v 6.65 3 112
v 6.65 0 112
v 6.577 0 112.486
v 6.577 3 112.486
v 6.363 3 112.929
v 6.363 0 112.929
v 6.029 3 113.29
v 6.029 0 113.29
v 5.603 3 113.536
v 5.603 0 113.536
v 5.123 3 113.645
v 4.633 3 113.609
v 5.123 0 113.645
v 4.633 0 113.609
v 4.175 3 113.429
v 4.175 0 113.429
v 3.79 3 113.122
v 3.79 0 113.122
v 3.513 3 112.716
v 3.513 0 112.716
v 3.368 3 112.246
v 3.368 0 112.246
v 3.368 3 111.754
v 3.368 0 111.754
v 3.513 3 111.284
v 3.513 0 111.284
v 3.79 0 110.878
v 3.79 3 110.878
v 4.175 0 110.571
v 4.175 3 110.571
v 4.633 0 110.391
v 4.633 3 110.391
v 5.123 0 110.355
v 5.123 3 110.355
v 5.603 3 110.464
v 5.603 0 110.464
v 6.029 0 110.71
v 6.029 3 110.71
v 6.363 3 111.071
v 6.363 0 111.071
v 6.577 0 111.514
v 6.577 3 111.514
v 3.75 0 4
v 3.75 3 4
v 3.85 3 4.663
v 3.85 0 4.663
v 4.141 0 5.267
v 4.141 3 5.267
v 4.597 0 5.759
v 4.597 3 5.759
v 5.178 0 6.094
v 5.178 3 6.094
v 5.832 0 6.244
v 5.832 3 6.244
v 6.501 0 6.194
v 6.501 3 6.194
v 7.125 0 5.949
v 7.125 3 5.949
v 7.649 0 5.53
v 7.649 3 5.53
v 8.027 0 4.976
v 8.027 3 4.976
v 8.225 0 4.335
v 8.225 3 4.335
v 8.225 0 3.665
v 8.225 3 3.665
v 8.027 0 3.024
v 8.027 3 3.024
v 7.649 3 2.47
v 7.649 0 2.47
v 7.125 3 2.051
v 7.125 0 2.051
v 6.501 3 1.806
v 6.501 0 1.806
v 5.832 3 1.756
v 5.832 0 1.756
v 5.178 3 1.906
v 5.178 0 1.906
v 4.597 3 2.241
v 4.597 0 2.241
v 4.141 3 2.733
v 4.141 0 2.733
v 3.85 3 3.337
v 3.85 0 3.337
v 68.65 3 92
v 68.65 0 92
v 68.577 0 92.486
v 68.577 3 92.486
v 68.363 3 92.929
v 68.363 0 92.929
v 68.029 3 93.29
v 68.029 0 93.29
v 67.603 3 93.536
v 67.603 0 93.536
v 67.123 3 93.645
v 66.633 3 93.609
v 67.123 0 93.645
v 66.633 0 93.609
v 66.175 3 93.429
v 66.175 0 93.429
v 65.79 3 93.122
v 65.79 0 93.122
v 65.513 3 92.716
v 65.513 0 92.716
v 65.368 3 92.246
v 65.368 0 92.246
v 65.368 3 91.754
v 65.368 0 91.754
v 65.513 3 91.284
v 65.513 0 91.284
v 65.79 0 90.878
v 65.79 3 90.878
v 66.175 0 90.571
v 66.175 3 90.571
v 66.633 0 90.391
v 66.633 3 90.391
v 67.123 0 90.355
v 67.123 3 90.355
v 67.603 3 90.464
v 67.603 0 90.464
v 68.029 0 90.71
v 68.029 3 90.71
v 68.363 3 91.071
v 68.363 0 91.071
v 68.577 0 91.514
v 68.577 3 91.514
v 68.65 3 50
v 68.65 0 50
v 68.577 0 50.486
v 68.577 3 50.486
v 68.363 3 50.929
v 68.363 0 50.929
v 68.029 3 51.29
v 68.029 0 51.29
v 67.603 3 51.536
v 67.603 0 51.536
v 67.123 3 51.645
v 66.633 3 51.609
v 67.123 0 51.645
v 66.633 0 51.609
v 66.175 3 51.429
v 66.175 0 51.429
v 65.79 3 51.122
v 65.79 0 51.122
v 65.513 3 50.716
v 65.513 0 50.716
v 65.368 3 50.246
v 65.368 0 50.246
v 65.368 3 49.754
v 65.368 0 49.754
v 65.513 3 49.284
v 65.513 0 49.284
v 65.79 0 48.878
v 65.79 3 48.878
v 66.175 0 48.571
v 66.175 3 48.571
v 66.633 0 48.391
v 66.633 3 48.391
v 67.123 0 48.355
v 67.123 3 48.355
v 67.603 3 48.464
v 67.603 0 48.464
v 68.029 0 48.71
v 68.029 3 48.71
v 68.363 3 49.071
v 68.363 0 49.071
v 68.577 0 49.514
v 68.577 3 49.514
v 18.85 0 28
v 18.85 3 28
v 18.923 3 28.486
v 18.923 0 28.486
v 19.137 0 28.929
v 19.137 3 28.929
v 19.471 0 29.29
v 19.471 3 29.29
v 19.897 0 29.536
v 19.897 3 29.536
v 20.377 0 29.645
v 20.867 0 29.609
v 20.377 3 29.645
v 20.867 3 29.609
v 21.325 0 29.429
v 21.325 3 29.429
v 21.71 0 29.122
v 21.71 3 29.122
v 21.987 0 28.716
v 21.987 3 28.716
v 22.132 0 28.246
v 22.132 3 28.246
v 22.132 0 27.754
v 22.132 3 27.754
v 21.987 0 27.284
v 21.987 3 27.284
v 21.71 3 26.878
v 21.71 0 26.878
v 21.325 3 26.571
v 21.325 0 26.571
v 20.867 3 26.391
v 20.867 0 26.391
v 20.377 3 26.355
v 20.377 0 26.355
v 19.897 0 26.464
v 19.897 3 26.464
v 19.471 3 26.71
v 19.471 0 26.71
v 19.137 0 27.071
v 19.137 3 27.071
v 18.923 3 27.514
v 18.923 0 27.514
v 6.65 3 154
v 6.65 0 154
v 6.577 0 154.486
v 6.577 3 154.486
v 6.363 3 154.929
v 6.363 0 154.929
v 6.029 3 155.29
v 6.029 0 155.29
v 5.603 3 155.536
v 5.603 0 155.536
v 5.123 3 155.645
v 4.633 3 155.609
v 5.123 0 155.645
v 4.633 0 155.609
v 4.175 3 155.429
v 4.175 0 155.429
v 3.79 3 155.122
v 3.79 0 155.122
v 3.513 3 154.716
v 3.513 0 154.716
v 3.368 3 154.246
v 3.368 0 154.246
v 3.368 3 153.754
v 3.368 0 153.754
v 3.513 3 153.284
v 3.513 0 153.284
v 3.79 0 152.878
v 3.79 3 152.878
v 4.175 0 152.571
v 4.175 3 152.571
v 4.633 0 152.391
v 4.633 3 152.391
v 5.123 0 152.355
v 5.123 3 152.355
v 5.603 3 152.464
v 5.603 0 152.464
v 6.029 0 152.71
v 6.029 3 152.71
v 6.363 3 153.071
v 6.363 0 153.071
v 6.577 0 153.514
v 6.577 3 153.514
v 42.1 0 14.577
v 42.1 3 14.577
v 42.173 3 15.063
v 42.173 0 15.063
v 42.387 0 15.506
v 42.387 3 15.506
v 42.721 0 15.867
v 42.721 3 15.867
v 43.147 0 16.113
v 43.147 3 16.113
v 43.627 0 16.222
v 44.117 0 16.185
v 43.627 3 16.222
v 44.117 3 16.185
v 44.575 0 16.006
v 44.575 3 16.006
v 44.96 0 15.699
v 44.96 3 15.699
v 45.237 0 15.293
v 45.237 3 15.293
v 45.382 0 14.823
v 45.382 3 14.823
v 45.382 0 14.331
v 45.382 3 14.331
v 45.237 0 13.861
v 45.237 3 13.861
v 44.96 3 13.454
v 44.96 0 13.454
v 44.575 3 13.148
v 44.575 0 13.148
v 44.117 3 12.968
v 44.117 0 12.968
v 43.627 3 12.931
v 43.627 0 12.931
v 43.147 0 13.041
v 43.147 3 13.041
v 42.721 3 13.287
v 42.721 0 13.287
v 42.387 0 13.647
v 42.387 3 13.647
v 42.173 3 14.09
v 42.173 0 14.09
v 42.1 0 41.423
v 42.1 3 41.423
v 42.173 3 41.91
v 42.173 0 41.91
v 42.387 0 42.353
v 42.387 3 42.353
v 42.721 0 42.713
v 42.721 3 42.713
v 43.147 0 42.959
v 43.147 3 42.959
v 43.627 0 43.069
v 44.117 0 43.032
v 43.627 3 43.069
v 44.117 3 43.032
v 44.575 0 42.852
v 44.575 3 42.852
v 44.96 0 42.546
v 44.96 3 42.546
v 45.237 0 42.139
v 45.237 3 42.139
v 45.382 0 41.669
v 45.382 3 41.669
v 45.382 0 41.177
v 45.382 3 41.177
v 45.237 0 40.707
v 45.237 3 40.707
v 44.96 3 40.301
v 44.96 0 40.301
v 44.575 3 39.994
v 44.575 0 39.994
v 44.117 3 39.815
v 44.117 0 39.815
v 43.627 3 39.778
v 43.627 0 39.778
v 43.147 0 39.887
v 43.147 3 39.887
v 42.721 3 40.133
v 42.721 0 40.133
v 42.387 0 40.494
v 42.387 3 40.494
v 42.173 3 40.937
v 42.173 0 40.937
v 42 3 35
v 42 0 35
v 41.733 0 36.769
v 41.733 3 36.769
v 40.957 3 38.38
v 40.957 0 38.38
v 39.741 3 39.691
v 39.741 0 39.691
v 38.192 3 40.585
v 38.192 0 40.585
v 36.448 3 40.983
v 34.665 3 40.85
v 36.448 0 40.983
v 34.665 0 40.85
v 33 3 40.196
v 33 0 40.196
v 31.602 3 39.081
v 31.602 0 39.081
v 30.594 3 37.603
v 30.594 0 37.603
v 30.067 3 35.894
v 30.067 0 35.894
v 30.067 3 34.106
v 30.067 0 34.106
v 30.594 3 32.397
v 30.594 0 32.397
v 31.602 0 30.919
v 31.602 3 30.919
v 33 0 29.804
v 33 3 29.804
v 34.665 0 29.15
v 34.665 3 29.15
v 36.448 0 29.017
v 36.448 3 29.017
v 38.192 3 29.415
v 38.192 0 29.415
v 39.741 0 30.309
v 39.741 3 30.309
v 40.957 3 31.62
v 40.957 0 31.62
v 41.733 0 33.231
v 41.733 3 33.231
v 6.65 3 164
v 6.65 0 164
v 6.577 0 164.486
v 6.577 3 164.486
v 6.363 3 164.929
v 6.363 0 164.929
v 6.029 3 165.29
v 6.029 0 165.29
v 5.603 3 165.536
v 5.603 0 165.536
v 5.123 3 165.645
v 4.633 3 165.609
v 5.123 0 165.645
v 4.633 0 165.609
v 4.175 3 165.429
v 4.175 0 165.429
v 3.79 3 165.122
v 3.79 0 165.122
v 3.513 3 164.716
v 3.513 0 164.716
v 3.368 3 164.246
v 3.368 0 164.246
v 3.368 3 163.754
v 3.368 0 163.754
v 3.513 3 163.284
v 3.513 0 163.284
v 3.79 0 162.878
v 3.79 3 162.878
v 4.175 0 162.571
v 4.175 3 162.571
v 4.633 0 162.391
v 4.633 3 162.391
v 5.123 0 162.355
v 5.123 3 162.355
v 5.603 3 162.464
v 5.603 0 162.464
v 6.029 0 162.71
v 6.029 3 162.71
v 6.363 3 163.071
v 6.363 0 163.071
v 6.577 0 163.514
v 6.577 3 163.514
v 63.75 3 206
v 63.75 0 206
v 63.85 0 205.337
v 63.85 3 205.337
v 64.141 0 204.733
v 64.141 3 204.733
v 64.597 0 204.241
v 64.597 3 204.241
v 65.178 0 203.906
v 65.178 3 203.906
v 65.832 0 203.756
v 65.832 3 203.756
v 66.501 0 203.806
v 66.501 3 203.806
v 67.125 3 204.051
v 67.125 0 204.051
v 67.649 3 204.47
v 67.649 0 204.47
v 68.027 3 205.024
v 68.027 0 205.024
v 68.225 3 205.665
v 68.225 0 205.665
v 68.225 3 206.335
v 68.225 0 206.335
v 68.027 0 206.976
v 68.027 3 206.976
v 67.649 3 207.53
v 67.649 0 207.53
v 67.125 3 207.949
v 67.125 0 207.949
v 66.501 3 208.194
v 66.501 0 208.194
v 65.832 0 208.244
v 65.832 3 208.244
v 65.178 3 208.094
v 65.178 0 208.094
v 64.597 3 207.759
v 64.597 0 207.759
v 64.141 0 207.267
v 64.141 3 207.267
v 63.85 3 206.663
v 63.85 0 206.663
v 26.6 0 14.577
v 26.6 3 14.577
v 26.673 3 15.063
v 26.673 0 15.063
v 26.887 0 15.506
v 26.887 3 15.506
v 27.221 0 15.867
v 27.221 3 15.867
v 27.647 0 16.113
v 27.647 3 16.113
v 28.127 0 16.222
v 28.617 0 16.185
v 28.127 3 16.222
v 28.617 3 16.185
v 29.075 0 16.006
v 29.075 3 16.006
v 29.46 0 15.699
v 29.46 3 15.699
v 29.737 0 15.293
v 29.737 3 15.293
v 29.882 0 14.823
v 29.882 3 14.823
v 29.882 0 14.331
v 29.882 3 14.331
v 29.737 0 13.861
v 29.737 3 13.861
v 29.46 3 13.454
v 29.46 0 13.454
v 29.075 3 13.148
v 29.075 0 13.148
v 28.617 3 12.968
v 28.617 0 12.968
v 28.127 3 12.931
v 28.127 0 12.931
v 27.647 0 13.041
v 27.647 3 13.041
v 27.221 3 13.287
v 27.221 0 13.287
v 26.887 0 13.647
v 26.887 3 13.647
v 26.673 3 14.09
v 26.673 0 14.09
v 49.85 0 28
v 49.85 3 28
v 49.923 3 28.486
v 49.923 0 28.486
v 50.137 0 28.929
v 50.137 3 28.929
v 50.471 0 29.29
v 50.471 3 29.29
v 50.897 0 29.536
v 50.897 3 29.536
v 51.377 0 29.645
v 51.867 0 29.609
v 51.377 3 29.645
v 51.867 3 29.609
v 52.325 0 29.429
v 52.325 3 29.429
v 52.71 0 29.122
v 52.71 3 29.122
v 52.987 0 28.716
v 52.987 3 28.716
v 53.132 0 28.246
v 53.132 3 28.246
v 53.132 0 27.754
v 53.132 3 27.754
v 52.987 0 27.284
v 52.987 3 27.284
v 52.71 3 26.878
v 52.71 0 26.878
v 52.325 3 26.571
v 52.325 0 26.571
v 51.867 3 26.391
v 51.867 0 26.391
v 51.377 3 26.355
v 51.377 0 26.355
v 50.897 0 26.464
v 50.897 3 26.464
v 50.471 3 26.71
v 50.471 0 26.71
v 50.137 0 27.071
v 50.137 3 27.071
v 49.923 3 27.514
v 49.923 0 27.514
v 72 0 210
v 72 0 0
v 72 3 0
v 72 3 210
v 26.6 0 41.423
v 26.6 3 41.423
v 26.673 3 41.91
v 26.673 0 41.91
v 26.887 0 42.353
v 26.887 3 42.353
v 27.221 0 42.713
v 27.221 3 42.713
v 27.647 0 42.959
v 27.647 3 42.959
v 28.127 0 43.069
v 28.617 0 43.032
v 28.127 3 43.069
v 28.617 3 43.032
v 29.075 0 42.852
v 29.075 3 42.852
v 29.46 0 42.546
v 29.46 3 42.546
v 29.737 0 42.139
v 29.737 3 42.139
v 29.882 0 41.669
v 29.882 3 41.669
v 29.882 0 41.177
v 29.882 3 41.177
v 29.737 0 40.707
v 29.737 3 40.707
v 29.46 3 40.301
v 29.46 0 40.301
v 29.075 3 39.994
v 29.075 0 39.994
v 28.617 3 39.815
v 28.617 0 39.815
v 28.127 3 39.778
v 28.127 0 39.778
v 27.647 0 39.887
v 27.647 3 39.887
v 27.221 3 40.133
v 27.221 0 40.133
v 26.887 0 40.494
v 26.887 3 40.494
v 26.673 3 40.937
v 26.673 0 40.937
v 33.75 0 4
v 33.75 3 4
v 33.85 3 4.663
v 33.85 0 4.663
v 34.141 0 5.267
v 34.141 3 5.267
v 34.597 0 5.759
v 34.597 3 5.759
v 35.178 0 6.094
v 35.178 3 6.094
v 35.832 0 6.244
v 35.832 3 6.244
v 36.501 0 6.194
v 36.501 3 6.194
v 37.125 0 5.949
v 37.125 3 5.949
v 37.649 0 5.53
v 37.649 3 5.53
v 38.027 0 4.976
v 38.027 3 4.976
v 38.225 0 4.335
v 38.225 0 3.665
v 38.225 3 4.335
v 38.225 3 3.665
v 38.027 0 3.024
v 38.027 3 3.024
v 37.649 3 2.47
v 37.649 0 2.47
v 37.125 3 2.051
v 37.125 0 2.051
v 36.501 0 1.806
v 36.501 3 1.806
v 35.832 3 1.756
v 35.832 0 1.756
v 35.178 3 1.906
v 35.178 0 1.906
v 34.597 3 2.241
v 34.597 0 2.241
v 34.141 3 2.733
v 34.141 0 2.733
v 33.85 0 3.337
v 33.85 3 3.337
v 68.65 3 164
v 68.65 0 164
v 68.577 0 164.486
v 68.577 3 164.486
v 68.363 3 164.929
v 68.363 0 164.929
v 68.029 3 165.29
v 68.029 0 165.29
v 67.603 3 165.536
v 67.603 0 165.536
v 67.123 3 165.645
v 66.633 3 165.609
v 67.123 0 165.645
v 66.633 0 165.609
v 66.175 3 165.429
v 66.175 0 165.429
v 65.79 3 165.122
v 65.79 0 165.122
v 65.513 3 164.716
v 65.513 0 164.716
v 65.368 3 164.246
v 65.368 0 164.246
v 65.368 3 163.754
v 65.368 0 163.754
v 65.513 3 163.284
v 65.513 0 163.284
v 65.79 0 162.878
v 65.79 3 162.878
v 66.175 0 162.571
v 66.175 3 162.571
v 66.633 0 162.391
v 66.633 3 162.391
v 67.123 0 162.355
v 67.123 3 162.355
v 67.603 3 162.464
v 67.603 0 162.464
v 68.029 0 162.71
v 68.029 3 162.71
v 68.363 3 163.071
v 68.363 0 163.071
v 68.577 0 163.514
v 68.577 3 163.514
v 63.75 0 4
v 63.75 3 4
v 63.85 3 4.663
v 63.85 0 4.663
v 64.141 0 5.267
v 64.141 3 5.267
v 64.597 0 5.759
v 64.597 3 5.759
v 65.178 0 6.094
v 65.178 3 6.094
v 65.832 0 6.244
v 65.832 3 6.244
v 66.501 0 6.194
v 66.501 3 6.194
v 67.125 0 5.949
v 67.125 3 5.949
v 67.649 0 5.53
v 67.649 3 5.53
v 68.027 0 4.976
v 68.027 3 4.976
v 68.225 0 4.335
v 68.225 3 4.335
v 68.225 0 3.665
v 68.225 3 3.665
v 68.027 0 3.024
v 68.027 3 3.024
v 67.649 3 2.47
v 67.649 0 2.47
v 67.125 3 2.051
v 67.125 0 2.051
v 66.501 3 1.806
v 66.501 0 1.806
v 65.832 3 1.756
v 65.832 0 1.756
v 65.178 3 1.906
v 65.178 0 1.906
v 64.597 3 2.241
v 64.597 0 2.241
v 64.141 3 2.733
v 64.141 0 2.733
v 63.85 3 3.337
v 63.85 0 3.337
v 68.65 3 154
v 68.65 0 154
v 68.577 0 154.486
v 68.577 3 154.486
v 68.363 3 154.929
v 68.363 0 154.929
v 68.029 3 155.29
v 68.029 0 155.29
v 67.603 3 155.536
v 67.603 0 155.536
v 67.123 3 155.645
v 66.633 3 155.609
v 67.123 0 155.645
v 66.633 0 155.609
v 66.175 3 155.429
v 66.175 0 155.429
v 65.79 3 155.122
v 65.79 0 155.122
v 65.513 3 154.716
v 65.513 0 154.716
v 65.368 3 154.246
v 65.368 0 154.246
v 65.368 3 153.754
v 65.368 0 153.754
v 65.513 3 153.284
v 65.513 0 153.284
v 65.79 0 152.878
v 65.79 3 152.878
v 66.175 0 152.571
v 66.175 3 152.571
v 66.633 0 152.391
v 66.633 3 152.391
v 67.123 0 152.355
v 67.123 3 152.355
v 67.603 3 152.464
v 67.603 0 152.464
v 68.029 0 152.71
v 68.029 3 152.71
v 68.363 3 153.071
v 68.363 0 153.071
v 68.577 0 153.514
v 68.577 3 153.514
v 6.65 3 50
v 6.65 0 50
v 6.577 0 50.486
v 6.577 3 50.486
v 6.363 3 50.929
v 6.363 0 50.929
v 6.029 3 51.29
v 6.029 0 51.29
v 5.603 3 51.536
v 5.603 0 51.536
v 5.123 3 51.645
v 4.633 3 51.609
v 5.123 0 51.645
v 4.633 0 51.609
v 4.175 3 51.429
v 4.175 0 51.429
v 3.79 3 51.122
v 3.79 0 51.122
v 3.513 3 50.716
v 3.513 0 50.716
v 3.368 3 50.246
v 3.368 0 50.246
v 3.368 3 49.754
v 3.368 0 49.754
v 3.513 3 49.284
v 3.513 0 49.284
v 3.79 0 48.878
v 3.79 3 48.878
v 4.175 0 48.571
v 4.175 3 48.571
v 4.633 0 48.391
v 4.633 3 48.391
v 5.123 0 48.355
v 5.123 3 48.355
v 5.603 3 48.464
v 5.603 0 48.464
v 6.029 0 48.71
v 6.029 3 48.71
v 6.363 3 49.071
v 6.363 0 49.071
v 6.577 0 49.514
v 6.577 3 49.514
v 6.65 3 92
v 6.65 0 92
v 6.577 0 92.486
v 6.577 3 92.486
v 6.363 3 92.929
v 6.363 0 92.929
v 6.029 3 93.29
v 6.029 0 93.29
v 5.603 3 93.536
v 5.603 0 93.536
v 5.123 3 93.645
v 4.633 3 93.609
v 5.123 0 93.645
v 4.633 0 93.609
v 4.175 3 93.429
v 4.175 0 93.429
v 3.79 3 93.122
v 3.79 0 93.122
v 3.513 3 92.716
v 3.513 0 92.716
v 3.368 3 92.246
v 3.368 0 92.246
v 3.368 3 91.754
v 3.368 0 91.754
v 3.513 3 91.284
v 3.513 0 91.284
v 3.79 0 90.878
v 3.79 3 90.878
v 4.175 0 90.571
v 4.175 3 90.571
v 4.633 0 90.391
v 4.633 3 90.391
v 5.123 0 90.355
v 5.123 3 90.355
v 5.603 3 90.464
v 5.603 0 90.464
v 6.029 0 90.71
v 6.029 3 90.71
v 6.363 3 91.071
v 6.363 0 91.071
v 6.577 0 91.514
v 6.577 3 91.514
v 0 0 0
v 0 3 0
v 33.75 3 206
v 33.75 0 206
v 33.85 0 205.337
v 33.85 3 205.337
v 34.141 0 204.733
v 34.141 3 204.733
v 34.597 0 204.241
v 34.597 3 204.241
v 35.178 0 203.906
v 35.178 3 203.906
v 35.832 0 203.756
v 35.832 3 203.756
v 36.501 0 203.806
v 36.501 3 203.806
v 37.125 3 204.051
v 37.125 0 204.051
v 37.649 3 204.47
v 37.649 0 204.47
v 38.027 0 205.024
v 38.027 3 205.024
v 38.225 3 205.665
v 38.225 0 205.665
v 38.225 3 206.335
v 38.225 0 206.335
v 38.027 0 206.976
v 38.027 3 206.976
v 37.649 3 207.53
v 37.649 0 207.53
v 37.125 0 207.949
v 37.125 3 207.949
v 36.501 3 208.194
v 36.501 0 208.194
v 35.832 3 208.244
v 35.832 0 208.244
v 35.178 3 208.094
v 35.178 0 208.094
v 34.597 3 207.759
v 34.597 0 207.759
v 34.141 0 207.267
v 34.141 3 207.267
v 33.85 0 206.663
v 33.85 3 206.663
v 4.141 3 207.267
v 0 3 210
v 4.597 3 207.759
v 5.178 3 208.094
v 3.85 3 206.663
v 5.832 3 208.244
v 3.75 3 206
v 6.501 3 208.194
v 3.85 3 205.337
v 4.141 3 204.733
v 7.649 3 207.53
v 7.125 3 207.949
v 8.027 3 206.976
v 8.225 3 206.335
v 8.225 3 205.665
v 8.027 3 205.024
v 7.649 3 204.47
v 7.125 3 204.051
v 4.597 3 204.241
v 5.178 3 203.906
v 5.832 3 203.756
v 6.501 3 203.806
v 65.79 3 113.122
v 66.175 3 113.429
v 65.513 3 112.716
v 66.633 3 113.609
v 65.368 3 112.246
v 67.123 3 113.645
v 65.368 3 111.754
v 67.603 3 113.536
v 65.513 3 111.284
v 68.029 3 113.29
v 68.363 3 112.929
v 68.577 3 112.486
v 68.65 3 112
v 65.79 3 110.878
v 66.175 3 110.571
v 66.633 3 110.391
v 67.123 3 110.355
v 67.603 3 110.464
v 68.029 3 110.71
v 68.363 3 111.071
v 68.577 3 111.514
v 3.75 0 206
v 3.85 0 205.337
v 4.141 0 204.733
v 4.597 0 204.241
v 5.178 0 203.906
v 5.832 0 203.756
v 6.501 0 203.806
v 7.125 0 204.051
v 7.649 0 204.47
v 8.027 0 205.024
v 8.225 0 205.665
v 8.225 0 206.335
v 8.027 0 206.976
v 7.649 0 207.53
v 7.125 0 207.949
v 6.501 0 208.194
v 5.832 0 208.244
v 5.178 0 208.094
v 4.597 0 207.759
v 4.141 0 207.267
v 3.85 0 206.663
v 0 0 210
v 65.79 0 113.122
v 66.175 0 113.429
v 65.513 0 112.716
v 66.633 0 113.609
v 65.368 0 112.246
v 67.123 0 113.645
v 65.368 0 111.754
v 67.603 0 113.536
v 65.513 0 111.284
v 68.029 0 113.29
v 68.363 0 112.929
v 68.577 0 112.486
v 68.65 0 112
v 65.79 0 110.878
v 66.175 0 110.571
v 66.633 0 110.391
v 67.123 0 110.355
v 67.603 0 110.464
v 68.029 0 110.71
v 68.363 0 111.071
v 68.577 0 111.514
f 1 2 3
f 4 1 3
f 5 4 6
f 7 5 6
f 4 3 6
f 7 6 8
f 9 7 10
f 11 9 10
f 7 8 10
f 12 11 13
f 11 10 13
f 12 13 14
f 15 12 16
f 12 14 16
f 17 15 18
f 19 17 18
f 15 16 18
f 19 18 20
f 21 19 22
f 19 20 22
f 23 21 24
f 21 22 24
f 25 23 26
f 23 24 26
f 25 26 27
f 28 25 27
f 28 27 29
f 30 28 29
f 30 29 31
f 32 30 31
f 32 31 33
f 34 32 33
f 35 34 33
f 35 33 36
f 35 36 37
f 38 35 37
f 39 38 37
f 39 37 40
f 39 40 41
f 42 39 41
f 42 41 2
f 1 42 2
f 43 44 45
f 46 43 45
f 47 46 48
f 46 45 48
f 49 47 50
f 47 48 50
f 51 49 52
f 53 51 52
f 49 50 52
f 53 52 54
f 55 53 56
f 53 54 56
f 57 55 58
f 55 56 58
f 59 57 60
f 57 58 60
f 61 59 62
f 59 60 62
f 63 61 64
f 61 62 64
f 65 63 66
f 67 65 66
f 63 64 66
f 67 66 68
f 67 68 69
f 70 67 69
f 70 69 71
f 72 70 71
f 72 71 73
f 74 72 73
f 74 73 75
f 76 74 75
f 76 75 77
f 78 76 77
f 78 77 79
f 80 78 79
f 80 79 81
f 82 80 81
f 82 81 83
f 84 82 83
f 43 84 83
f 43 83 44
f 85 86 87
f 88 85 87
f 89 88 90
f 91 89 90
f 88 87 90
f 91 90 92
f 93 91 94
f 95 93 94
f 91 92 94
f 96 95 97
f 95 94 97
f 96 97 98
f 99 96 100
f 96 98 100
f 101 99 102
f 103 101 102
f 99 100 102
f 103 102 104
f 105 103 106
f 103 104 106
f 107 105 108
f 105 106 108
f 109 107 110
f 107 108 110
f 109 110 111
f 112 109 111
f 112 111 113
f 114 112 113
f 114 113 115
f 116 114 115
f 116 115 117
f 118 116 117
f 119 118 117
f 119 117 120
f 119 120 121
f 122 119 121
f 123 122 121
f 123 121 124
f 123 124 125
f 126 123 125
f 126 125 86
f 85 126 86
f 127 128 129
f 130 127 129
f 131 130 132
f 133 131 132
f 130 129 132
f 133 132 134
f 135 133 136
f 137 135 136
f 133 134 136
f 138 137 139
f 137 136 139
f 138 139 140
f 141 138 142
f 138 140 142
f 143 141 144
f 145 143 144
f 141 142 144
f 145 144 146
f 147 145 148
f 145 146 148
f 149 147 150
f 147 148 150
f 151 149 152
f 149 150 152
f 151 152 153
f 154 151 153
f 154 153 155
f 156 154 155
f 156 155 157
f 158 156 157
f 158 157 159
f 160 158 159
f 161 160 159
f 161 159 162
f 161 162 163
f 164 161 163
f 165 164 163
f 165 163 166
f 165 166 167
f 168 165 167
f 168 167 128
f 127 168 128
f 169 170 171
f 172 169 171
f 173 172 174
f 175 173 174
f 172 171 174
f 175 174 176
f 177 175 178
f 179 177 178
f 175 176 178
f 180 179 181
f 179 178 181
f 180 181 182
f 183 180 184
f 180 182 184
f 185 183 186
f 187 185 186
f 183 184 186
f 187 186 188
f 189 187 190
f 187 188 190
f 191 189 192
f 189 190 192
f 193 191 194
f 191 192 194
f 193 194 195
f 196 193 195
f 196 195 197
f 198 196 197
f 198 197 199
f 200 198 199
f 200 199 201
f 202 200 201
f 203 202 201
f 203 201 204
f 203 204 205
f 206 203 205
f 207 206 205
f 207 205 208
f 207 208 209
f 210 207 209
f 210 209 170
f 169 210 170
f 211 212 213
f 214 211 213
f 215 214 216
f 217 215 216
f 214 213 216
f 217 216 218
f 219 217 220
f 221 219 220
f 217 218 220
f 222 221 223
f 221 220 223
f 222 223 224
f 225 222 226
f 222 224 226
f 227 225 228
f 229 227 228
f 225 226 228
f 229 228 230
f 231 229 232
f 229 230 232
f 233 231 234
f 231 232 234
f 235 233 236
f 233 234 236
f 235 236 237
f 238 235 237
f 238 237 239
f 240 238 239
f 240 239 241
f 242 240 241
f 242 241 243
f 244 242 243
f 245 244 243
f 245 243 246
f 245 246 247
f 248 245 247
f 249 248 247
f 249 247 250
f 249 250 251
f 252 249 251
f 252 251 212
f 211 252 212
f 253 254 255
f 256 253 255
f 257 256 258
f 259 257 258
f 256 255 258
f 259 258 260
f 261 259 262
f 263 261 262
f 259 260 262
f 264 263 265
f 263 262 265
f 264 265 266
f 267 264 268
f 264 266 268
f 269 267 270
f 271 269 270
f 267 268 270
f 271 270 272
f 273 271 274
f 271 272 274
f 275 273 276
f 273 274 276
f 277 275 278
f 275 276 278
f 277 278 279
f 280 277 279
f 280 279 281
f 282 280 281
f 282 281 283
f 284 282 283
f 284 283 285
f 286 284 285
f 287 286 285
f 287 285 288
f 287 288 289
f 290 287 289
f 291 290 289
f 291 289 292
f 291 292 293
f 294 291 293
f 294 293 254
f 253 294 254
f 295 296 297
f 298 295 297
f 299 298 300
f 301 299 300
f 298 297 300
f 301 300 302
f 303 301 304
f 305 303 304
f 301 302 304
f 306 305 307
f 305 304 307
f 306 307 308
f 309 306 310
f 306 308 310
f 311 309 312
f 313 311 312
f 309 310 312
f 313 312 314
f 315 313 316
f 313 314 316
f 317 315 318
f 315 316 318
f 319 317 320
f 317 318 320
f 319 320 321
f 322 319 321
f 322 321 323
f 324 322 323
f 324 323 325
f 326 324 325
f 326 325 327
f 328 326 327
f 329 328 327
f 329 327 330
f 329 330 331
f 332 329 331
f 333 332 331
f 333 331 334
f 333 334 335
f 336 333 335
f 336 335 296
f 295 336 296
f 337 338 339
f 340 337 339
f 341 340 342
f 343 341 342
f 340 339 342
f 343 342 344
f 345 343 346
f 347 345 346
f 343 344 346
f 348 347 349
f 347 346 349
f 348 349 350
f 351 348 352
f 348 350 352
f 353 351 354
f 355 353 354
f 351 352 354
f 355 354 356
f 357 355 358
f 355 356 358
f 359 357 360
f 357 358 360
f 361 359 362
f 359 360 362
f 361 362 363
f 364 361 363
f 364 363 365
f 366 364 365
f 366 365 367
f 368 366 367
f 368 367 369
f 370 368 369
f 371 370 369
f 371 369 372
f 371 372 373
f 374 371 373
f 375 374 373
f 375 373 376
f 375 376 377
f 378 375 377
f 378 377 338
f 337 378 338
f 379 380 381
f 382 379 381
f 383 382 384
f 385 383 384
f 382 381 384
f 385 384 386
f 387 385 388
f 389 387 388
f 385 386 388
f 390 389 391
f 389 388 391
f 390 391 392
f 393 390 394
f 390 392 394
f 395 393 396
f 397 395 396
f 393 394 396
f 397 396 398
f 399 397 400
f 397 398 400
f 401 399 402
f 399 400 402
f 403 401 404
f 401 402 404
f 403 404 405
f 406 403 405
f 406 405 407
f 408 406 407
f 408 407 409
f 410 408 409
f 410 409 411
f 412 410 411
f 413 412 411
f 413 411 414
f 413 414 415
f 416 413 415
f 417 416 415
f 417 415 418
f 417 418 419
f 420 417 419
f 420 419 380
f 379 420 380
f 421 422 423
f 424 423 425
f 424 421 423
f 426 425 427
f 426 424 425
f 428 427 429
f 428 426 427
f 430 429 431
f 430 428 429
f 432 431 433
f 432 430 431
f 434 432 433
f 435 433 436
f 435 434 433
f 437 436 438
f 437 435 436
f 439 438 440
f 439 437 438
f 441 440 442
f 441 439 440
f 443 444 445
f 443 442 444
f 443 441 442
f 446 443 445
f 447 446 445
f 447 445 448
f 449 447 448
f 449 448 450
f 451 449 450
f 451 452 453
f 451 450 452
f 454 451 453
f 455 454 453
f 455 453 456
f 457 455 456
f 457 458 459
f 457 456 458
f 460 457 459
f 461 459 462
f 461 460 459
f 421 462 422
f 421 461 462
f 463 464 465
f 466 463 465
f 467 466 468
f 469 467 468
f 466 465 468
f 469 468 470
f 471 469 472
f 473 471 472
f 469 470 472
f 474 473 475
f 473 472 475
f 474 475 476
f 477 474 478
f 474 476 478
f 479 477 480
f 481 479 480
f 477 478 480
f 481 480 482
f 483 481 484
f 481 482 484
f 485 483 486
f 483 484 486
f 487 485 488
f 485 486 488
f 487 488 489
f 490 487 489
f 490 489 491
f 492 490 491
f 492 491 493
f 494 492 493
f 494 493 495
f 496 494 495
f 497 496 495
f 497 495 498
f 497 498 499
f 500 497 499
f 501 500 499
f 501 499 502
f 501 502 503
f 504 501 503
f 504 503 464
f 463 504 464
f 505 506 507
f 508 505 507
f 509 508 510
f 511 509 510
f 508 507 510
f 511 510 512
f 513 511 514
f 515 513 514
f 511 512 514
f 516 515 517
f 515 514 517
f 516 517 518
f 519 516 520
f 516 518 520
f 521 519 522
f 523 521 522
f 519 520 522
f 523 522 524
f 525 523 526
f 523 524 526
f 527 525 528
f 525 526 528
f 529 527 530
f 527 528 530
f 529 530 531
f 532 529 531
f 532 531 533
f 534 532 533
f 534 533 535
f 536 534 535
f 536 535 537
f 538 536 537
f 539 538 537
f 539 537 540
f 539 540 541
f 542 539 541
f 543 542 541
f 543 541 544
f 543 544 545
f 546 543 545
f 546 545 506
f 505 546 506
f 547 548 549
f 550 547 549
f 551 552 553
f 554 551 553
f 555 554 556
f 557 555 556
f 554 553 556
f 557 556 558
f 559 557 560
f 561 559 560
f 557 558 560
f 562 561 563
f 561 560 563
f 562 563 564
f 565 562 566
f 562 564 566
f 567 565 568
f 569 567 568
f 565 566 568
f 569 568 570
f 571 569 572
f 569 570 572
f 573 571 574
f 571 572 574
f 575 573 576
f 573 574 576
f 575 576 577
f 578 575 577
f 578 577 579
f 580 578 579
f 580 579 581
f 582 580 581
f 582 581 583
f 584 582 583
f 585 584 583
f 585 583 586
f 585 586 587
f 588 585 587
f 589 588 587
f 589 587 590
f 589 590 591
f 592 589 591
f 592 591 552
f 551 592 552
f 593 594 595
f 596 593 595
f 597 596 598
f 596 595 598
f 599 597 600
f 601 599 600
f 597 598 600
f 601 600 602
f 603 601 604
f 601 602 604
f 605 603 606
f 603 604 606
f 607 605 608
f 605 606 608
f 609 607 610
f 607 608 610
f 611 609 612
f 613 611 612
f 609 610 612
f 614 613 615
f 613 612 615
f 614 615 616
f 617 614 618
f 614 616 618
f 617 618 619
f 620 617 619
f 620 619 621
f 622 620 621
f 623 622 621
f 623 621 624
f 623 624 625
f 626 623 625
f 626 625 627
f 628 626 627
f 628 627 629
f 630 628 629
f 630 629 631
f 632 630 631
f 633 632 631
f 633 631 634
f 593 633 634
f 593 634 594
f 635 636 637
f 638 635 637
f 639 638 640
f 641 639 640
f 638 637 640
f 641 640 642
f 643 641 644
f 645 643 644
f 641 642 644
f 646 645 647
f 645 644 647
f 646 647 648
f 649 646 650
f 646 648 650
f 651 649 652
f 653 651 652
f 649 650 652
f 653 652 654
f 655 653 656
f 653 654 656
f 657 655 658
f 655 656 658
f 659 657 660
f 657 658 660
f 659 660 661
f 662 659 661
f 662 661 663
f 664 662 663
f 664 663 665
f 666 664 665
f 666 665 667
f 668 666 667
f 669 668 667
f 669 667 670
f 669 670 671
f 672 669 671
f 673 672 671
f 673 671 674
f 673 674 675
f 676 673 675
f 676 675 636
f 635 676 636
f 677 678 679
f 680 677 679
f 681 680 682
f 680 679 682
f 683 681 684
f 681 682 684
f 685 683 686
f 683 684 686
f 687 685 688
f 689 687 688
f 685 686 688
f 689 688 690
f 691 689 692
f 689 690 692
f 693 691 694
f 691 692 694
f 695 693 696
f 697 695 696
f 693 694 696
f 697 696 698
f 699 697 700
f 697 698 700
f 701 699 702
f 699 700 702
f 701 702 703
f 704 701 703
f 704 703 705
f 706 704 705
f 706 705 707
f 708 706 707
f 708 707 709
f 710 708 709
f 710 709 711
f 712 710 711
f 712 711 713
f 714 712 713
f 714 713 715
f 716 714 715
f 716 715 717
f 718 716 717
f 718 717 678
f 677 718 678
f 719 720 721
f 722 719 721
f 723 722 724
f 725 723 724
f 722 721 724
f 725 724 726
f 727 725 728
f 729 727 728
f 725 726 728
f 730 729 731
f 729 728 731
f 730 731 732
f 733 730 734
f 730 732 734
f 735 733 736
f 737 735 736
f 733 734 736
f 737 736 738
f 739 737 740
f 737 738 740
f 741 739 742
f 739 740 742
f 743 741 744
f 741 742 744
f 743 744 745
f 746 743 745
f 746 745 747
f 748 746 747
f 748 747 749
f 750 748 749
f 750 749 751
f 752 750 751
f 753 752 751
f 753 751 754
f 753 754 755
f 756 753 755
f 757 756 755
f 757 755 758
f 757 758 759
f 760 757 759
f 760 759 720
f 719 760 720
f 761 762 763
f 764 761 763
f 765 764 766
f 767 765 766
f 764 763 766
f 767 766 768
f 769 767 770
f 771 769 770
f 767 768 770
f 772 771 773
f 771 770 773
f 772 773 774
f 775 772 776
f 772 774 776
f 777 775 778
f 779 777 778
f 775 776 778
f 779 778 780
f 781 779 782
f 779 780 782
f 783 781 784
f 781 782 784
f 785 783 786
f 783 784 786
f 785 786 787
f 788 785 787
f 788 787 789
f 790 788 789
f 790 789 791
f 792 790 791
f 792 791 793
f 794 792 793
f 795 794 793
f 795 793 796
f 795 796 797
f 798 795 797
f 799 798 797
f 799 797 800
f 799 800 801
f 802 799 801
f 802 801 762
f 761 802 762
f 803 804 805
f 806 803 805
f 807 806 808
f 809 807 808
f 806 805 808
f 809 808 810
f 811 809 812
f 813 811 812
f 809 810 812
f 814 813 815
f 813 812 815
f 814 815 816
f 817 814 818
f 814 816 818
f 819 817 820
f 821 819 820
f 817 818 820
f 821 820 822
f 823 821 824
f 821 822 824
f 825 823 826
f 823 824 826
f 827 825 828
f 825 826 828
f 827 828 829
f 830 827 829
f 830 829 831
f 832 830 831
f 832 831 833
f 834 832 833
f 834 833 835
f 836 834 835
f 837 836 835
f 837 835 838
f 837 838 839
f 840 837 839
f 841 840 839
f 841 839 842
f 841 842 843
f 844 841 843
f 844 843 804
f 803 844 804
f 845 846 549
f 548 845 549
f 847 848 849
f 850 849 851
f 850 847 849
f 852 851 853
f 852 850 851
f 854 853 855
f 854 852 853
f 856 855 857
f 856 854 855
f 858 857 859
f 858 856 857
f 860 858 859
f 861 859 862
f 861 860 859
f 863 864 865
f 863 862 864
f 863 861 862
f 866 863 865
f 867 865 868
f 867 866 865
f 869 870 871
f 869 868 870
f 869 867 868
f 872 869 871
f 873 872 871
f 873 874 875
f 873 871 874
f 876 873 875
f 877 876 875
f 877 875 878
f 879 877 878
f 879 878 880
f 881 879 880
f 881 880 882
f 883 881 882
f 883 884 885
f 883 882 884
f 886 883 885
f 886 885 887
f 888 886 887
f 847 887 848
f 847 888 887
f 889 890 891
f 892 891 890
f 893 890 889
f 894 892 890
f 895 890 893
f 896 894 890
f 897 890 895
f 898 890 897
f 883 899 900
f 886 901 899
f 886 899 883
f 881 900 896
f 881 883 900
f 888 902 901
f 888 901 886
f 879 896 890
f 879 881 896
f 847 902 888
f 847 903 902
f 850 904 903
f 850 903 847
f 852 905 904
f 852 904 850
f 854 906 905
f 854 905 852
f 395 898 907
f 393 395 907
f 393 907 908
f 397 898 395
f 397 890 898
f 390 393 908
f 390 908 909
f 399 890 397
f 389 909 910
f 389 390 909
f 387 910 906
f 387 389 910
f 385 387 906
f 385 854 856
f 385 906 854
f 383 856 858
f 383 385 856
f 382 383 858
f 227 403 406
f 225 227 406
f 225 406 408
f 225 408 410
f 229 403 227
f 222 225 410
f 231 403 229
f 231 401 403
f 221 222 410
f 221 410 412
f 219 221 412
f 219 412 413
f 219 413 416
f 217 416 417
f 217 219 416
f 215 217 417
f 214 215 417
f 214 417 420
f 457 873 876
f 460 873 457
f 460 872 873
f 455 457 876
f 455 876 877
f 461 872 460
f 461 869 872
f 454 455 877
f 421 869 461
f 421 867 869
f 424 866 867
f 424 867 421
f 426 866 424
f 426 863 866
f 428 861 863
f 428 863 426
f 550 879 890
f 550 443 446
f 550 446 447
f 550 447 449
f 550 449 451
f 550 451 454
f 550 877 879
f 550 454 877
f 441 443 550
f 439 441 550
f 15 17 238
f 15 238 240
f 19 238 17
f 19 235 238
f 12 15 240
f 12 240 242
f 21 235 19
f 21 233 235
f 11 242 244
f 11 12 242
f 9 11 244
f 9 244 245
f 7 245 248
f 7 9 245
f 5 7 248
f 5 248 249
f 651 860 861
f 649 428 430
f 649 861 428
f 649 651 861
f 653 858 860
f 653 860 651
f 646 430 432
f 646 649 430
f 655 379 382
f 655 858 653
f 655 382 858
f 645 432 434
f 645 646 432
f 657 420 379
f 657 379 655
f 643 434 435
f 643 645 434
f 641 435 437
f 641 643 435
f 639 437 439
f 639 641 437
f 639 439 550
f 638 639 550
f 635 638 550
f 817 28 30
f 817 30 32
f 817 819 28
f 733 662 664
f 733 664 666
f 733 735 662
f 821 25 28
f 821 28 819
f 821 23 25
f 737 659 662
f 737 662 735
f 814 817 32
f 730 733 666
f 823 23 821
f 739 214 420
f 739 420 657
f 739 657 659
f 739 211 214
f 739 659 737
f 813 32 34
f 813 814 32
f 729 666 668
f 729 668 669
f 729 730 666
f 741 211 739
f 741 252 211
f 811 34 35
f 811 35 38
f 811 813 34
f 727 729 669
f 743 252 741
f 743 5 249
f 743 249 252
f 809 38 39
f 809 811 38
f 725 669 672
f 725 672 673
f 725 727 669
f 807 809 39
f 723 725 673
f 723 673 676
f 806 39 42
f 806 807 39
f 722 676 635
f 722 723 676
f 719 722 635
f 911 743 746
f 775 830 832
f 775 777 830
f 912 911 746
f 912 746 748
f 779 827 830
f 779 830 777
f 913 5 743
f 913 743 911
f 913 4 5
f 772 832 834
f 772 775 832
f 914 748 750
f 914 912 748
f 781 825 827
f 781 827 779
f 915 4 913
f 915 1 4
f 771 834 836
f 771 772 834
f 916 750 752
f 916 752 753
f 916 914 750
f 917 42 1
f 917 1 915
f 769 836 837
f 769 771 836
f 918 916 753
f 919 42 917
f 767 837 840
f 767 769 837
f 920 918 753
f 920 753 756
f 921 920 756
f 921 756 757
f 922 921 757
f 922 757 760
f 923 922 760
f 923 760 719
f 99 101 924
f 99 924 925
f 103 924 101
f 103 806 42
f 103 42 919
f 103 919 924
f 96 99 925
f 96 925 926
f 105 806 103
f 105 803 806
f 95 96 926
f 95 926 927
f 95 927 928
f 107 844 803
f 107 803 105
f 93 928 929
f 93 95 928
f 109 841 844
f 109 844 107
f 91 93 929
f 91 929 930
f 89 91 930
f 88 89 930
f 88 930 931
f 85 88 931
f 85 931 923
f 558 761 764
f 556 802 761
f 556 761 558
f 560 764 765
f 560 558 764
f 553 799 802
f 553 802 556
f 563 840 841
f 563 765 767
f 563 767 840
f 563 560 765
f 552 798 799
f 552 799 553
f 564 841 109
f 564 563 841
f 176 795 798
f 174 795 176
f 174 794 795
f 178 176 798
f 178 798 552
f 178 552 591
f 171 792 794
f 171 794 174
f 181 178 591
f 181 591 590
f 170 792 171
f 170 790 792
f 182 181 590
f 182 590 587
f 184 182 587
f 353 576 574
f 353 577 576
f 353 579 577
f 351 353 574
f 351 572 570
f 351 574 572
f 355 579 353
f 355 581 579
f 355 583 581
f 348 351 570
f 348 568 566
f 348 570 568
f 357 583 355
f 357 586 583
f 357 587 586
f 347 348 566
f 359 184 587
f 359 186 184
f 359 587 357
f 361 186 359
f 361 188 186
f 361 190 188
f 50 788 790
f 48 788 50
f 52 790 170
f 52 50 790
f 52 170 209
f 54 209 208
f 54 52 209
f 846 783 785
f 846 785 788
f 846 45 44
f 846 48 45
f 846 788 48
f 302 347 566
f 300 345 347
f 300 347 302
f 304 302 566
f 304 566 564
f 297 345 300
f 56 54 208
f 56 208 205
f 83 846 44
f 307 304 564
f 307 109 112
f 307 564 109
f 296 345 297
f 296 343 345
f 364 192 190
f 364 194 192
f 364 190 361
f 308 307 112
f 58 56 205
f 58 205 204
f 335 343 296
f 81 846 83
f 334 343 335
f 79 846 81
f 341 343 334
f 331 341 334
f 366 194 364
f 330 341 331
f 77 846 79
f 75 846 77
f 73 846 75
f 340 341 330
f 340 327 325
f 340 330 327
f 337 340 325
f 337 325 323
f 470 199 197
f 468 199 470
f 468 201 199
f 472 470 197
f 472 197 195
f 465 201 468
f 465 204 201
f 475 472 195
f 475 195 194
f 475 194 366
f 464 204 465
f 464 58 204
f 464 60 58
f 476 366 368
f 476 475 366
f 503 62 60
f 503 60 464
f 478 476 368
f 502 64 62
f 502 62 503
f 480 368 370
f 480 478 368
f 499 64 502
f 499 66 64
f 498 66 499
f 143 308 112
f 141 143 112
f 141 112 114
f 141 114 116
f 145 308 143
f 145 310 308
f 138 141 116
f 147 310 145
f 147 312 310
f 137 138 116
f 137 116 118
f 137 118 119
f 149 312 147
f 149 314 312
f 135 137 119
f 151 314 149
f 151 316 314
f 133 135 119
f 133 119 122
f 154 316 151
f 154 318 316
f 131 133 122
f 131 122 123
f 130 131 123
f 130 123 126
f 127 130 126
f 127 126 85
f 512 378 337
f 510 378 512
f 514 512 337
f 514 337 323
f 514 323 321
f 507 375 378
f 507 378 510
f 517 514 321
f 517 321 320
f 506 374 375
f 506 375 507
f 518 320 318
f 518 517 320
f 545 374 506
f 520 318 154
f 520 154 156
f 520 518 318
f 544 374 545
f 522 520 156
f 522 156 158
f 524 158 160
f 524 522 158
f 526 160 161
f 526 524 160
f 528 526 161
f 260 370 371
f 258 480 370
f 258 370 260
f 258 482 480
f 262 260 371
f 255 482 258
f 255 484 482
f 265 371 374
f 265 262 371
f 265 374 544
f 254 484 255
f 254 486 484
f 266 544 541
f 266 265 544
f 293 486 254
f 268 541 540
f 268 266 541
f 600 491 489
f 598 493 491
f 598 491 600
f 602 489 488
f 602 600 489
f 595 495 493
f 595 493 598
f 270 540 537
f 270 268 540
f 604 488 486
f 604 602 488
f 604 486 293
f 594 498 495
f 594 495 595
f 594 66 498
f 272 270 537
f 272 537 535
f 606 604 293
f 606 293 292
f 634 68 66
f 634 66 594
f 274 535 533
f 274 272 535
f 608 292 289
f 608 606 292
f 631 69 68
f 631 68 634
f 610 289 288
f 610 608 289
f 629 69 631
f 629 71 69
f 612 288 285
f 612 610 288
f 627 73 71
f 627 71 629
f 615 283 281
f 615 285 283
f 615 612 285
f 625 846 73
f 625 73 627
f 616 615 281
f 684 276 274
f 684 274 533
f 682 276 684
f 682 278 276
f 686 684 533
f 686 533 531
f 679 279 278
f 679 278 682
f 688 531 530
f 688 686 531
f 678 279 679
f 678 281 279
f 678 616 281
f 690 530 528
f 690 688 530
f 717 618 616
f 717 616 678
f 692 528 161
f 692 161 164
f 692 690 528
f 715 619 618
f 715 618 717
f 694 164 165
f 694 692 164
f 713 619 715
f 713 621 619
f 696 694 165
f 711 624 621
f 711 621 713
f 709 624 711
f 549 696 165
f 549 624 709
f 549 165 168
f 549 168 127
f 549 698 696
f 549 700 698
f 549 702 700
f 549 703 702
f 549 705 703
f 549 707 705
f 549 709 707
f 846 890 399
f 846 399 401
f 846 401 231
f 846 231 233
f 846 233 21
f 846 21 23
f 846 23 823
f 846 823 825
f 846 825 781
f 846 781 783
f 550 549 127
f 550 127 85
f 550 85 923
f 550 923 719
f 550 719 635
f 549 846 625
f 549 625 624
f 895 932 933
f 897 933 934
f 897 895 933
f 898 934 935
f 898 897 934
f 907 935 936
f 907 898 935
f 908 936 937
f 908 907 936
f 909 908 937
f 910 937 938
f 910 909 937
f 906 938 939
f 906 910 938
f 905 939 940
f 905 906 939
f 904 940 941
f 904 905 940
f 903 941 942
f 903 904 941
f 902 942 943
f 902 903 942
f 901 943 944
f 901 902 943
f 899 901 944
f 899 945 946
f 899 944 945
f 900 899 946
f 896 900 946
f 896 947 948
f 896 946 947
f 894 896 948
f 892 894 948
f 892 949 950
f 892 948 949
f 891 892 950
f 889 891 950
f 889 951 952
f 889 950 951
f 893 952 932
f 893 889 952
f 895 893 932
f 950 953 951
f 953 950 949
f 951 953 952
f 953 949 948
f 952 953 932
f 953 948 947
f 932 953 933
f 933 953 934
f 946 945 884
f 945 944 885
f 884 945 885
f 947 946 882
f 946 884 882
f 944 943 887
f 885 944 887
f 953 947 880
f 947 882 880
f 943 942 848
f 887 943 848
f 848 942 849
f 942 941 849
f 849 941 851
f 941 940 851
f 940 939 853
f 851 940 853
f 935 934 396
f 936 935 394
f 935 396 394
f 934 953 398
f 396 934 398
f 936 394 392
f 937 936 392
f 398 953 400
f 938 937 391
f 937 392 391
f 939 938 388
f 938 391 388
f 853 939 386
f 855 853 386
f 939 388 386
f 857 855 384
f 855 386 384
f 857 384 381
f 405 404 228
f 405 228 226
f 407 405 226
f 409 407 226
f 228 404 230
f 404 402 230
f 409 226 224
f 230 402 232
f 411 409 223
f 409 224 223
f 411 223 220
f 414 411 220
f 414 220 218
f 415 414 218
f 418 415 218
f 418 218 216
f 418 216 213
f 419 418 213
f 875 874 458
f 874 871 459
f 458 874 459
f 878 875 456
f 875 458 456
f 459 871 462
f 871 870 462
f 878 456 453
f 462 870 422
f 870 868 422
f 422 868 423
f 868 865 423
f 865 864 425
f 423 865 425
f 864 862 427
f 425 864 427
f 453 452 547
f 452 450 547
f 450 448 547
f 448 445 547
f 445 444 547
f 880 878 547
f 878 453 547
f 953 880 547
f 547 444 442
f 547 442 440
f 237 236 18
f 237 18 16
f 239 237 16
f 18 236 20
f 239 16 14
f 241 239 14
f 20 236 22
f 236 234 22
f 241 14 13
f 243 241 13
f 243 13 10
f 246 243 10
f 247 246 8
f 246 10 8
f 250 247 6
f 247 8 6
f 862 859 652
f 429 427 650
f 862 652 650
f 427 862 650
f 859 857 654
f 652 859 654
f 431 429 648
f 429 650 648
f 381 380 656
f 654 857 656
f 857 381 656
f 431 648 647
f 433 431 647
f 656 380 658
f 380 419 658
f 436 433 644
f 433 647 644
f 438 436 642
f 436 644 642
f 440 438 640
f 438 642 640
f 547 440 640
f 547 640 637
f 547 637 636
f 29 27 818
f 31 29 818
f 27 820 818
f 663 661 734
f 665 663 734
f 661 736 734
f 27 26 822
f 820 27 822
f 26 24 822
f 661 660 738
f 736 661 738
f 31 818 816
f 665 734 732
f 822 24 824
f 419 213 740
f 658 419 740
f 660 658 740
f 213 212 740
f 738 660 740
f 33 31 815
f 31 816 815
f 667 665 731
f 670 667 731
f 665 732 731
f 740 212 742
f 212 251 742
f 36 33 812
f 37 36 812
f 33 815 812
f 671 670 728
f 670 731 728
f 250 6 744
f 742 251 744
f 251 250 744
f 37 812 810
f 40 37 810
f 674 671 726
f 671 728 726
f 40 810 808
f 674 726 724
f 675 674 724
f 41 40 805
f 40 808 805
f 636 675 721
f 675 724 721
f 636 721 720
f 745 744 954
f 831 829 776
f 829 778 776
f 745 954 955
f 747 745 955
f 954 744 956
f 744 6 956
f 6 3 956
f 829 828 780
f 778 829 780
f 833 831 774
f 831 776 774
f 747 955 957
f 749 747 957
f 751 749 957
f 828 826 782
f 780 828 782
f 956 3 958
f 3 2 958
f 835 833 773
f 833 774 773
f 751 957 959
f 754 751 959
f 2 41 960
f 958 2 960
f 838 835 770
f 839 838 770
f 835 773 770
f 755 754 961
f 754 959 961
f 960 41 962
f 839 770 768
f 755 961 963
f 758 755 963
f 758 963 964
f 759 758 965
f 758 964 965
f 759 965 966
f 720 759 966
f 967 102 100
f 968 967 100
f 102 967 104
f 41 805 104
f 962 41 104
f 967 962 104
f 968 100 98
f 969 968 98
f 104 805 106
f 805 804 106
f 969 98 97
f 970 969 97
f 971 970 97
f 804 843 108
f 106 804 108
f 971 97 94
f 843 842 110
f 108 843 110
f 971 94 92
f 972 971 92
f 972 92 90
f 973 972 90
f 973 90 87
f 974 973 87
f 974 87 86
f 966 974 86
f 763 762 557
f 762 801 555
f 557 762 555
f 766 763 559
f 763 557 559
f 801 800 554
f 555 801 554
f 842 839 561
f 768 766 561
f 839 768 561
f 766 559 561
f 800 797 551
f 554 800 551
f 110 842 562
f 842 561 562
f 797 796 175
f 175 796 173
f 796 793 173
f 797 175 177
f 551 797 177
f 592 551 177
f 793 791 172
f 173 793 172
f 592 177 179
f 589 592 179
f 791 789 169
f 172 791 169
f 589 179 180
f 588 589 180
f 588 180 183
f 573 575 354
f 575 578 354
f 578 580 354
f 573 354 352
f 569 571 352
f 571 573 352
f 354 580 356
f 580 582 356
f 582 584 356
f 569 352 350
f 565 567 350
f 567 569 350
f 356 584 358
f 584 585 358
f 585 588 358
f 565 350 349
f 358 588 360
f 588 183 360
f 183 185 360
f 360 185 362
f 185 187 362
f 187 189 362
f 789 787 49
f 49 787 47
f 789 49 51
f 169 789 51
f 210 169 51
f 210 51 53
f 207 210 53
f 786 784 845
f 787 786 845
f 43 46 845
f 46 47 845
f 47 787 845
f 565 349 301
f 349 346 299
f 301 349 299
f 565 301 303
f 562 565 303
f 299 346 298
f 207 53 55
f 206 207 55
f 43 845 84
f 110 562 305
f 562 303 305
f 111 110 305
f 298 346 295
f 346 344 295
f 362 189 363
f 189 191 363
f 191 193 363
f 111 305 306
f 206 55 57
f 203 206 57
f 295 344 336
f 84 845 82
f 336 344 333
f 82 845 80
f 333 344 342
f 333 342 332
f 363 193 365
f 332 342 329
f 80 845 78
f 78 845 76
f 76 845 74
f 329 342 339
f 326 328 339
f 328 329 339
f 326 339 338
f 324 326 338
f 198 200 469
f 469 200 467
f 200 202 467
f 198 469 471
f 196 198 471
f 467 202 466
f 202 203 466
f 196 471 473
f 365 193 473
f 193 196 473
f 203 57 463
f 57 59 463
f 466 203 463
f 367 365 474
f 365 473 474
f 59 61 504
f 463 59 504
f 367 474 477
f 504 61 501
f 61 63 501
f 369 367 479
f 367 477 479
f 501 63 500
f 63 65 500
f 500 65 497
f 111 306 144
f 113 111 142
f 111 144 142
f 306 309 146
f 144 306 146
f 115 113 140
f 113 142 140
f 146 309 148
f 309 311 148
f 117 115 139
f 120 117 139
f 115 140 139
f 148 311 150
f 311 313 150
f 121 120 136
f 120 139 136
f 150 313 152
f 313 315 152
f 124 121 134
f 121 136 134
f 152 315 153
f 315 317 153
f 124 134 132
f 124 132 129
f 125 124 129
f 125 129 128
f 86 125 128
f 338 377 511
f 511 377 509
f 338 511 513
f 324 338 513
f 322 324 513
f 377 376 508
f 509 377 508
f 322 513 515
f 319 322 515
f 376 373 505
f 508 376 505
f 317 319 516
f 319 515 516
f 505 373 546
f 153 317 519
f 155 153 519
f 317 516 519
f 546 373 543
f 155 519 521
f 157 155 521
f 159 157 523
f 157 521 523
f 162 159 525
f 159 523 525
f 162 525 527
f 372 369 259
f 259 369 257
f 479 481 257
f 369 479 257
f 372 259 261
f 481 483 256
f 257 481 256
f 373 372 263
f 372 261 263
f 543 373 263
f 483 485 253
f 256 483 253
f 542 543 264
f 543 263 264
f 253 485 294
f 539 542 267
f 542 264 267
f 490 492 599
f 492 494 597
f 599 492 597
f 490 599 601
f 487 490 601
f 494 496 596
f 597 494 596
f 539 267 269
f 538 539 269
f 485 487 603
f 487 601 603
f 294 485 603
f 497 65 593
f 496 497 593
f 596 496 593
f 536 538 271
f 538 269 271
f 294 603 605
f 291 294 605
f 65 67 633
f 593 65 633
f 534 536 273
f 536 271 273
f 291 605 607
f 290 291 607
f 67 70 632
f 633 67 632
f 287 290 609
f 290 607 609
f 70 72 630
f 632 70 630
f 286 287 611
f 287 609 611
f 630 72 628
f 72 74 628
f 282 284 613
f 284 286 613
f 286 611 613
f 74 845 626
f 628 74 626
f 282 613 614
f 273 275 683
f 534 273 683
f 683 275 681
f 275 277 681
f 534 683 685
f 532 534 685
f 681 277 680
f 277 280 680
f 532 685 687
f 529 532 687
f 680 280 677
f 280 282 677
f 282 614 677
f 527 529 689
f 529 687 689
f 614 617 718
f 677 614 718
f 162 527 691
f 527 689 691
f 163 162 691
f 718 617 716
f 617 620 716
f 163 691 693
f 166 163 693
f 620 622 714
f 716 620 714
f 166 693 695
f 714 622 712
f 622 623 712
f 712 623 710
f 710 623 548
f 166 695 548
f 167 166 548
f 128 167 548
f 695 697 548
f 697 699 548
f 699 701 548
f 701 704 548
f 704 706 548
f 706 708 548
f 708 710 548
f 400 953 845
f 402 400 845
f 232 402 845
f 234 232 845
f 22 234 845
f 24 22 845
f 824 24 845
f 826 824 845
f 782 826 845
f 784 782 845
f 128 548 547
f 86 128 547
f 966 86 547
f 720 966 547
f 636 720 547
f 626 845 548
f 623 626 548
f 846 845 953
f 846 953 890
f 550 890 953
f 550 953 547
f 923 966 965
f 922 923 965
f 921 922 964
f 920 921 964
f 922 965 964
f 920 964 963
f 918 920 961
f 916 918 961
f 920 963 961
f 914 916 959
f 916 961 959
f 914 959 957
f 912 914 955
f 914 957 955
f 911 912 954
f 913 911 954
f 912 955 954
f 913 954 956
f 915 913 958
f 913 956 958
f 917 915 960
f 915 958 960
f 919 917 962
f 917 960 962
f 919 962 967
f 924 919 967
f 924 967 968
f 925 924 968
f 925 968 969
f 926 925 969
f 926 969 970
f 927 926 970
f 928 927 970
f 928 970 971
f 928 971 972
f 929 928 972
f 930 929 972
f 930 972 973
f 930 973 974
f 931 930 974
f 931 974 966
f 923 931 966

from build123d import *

# Parameters (mm, degrees)
SKETCH_AS_DRAWN_R                   = 2.25
EXTRUDE_DEPTH                       = 10
EXTRUDE_ONTO_SKETCH_ROLL_ANGLE      = 90
EXTRUDE_ONTO_SKETCH_PLACEMENT_ANGLE = 180
BOX_W                               = 72
BOX_H                               = 3
BOX_DEPTH                           = 210
SKETCH001_R                         = 1.65
HOLE_DEPTH                          = 25
SKETCH002_R                         = 1.65
HOLE001_DEPTH                       = 3.001
SKETCH004_R                         = 6
HOLE002_DEPTH                       = 25


with BuildPart() as extrude_body:
    # Sketch as drawn → Extrude (new)
    with BuildSketch(Plane.XY):
        with Locations((-6, 4)):
            Circle(SKETCH_AS_DRAWN_R)
        with Locations((-66, 4)):
            Circle(SKETCH_AS_DRAWN_R)
        with Locations((-36, 4)):
            Circle(SKETCH_AS_DRAWN_R)
    extrude(amount=-EXTRUDE_DEPTH)


with BuildPart() as extrude_body_1:
    # Extrude onto Sketch roll: moved
    add(extrude_body.part.rotate(Axis((0, 0, 0), (1, 0, 0)), EXTRUDE_ONTO_SKETCH_ROLL_ANGLE))


with BuildPart() as extrude_body_2:
    # Extrude onto Sketch placement: moved
    add(extrude_body_1.part.moved(Location((0, 3, 0))).rotate(Axis((0, 3, 0), (0, 0, 1)), EXTRUDE_ONTO_SKETCH_PLACEMENT_ANGLE))


with BuildPart() as part_mirroring:
    # Part__Mirroring: instance of Extrude body
    add(extrude_body_2.part.mirror(Plane(origin=(0, 0, 105), x_dir=(0, 1, 0), z_dir=(0, 0, 1))))


with BuildPart() as fusion:
    # Fusion base: copy of Extrude body
    add(extrude_body_2.part)

    # Fusion: union Part__Mirroring
    add(part_mirroring.part)


with BuildPart() as body:
    # Box → Box (new body)
    with BuildSketch(Plane.XY):
        with Locations((36, 1.5)):
            Rectangle(BOX_W, BOX_H)
    extrude(amount=BOX_DEPTH)

    # Cut: cut Fusion
    add(fusion.part, mode=Mode.SUBTRACT)

    # Sketch001 (on Face2 of BaseFeature) → Hole (cut)
    with BuildSketch(Plane.XZ):
        with Locations((67, 50)):
            Circle(SKETCH001_R)
        with Locations((5, 50)):
            Circle(SKETCH001_R)
        with Locations((67, 92)):
            Circle(SKETCH001_R)
        with Locations((5, 92)):
            Circle(SKETCH001_R)
        with Locations((67, 154)):
            Circle(SKETCH001_R)
        with Locations((5, 154)):
            Circle(SKETCH001_R)
        with Locations((5, 112)):
            Circle(SKETCH001_R)
        with Locations((67, 112)):
            Circle(SKETCH001_R)
        with Locations((5, 164)):
            Circle(SKETCH001_R)
        with Locations((67, 164)):
            Circle(SKETCH001_R)
    extrude(amount=-HOLE_DEPTH, mode=Mode.SUBTRACT)

    # Sketch002 (on Face4 of Hole) → Hole001 (cut, through all)
    with BuildSketch(Plane(origin=(0, 3, 0), x_dir=(-1, 0, 0), z_dir=(0, 1, 0))):
        with Locations((-36, 35)):
            Circle(SKETCH002_R)
        with Locations((-20.5, 28)):
            Circle(SKETCH002_R)
        with Locations((-28.25, 41.423394)):
            Circle(SKETCH002_R)
        with Locations((-43.75, 41.423394)):
            Circle(SKETCH002_R)
        with Locations((-43.75, 14.576606)):
            Circle(SKETCH002_R)
        with Locations((-28.25, 14.576606)):
            Circle(SKETCH002_R)
        with Locations((-51.5, 28)):
            Circle(SKETCH002_R)
    extrude(amount=-HOLE001_DEPTH, mode=Mode.SUBTRACT)

    # Sketch004 (on Face2 of Hole001) → Hole002 (cut)
    with BuildSketch(Plane.XZ):
        with Locations((36, 35)):
            Circle(SKETCH004_R)
    extrude(amount=-HOLE002_DEPTH, mode=Mode.SUBTRACT)


solid = body.part
